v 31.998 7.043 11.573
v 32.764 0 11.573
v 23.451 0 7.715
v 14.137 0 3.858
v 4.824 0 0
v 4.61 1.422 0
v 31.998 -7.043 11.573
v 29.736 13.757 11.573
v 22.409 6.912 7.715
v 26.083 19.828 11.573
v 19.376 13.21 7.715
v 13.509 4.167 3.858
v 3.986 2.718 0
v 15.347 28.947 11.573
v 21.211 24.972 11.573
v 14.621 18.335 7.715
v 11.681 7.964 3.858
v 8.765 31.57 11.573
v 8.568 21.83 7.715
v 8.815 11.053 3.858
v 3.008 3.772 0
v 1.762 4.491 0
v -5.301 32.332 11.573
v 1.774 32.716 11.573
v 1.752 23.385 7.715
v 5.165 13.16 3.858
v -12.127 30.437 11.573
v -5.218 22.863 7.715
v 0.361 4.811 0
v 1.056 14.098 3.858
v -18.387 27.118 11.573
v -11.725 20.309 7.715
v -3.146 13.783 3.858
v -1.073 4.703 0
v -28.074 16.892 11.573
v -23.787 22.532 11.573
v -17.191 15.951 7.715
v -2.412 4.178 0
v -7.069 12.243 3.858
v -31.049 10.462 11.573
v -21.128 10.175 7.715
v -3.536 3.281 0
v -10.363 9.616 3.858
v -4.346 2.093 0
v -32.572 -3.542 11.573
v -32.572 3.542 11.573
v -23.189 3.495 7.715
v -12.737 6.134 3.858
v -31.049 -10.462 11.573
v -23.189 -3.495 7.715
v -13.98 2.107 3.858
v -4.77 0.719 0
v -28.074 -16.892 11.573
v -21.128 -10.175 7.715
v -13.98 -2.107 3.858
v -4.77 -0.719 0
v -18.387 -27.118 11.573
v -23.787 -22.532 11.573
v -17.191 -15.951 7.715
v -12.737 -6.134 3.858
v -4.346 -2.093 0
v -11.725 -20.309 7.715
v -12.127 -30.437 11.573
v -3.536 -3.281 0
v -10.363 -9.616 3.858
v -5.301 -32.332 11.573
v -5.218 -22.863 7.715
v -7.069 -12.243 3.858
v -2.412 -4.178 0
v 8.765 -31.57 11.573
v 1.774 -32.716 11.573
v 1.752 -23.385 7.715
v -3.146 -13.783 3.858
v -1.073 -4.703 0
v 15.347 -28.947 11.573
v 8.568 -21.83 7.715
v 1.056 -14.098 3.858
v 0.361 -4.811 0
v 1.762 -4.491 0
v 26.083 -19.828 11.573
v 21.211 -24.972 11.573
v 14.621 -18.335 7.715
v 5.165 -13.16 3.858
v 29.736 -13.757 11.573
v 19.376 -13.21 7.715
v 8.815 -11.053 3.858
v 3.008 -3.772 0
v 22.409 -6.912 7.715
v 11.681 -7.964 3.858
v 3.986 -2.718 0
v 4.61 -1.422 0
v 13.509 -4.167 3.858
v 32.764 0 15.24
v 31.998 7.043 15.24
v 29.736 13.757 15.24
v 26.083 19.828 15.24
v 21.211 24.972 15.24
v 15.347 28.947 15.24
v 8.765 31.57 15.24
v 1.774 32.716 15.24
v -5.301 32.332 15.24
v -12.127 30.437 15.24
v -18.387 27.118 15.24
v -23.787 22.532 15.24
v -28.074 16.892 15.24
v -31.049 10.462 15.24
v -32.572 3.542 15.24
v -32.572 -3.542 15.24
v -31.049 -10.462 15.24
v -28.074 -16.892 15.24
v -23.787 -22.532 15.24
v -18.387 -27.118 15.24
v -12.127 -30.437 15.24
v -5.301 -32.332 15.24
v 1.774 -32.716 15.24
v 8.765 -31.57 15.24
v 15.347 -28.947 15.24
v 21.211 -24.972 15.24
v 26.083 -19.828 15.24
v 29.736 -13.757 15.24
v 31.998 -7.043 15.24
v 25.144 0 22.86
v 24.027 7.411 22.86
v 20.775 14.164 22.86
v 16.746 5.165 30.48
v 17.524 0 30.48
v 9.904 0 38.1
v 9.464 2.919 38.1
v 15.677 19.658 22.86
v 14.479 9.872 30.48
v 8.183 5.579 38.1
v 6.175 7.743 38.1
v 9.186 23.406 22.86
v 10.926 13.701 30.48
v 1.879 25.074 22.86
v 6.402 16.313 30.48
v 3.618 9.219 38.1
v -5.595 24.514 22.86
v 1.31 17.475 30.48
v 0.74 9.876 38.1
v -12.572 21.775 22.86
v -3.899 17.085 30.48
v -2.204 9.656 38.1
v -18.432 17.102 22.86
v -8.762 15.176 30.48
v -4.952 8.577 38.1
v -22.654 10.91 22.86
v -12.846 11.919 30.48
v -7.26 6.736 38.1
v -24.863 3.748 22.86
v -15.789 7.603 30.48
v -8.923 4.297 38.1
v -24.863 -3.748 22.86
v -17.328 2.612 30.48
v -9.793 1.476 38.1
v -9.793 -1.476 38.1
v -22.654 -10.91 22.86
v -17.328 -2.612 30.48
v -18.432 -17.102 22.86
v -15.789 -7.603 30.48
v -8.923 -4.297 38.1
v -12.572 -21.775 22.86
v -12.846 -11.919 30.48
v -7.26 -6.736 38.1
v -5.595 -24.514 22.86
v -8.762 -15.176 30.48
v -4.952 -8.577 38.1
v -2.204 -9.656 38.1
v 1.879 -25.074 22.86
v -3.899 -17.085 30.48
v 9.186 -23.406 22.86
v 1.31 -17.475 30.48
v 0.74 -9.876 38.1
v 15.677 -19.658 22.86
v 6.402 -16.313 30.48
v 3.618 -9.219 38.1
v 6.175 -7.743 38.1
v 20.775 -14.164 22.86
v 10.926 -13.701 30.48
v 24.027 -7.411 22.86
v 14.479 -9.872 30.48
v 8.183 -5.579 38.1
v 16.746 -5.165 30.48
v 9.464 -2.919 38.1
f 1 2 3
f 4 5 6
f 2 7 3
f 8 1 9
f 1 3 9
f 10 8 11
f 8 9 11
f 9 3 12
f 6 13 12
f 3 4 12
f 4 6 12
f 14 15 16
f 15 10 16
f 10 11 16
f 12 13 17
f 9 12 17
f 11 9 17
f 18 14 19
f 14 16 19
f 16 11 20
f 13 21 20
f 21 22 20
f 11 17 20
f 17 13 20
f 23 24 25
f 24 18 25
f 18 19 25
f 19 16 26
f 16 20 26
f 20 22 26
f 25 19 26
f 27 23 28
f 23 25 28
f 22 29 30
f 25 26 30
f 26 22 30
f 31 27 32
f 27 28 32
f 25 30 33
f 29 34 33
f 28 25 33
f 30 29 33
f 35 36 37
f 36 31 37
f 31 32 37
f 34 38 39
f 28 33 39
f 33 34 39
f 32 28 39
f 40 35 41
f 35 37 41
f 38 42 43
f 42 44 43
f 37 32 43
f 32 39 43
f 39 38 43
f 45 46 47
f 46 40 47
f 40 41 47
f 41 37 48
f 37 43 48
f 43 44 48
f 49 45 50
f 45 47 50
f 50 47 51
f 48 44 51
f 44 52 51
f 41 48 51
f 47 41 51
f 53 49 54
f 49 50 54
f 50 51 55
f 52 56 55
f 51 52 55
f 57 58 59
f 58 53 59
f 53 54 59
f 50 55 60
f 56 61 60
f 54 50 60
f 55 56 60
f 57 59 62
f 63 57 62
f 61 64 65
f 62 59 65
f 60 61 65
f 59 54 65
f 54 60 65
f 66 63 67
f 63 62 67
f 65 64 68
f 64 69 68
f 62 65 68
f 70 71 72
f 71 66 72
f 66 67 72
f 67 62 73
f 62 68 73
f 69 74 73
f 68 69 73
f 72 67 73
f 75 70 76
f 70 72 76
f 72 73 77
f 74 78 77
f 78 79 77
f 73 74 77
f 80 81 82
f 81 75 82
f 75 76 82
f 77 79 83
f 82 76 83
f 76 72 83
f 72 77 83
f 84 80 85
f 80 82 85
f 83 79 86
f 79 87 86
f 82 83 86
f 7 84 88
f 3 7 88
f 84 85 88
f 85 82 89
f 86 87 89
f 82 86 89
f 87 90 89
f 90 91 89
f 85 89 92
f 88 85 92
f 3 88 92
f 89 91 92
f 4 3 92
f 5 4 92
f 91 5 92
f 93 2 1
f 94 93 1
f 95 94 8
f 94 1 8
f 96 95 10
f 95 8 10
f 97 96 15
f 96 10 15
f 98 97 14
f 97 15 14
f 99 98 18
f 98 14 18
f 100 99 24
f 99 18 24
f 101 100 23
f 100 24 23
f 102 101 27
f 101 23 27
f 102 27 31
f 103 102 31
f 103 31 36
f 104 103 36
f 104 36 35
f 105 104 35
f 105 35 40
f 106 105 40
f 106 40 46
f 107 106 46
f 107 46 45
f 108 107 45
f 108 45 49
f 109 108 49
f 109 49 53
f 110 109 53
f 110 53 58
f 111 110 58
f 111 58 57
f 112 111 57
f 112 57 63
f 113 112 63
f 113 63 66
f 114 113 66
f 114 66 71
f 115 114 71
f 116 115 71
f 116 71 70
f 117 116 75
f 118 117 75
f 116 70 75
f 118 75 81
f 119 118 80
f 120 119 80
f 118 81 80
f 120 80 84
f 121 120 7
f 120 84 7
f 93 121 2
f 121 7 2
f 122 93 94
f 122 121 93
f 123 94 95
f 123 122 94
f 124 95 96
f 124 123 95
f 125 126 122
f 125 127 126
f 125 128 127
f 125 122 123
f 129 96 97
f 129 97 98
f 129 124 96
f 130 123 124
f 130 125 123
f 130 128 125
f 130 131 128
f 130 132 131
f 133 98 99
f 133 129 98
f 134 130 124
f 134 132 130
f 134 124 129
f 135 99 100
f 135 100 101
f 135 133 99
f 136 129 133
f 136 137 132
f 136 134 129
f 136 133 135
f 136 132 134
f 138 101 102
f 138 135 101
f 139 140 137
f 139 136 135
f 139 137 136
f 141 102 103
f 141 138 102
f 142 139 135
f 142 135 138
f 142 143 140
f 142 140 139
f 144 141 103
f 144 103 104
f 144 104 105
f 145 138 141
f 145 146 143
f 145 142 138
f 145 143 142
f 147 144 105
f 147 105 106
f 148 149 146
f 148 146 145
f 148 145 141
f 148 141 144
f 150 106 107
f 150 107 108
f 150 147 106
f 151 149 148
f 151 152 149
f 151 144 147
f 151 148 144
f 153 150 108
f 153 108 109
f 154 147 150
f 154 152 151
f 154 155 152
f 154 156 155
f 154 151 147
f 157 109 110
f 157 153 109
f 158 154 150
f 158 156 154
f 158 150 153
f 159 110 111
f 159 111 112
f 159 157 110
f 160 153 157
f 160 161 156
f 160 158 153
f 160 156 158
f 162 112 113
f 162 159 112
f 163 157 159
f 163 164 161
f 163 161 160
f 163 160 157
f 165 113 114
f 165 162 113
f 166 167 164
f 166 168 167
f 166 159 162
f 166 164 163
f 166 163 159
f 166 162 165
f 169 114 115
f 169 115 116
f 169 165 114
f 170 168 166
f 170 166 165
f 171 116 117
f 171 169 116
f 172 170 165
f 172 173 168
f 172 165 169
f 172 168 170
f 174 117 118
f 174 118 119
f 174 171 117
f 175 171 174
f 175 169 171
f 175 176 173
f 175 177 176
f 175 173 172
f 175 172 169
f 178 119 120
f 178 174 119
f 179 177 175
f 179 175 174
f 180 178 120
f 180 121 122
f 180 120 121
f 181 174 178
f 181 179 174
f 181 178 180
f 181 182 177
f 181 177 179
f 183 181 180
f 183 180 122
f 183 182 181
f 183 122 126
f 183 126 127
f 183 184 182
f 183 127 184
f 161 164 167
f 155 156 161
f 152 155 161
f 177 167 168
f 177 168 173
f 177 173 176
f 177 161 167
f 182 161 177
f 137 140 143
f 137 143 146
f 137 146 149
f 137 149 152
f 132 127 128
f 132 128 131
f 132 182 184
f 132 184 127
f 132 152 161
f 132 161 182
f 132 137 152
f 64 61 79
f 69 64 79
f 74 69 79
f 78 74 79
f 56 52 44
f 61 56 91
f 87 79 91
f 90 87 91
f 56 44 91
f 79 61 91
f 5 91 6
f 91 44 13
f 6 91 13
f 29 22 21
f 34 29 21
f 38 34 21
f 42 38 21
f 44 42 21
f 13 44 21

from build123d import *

# Parameters (mm, degrees)
F0_R     = 32.7640800534
F1_DEPTH = 38.1
F2_SIZE  = 22.86
F3_SIZE  = 5.08


# Not quite as in the source:
# - a fillet or chamfer that OpenCascade refuses, or shapes differently, is made with other operations: its cross-section is extruded or revolved along the edge and cut away or added


with BuildPart() as f1:
    # F0 (on Top) → F1 (new body)
    with BuildSketch(Plane.XY):
        Circle(F0_R)
    extrude(amount=F1_DEPTH)

    # F2
    f2_edges = [f1.edges().sort_by_distance(p)[0] for p in [
        (-32.76408, 0, 38.1),
    ]]
    chamfer(f2_edges, length=F2_SIZE)

    # F3
    f3_edges = [f1.edges().sort_by_distance(p)[0] for p in [
        (-32.76408, 0, 0),
    ]]
    chamfer(f3_edges, length=F3_SIZE)

    # F4: chamfer of 22.86 on 1 edges, made by hand

    # F4_s1 → F4_t2 (revolve, cut)
    with BuildSketch(Plane.XZ):
        Polygon((43.8485410713, 16.1644610179), (4.8240800534, 0), (27.6840800534, 0), align=None)
    revolve(axis=Axis((0, 0, 0), (0, 0, 1)), mode=Mode.SUBTRACT)


solid = f1.part
